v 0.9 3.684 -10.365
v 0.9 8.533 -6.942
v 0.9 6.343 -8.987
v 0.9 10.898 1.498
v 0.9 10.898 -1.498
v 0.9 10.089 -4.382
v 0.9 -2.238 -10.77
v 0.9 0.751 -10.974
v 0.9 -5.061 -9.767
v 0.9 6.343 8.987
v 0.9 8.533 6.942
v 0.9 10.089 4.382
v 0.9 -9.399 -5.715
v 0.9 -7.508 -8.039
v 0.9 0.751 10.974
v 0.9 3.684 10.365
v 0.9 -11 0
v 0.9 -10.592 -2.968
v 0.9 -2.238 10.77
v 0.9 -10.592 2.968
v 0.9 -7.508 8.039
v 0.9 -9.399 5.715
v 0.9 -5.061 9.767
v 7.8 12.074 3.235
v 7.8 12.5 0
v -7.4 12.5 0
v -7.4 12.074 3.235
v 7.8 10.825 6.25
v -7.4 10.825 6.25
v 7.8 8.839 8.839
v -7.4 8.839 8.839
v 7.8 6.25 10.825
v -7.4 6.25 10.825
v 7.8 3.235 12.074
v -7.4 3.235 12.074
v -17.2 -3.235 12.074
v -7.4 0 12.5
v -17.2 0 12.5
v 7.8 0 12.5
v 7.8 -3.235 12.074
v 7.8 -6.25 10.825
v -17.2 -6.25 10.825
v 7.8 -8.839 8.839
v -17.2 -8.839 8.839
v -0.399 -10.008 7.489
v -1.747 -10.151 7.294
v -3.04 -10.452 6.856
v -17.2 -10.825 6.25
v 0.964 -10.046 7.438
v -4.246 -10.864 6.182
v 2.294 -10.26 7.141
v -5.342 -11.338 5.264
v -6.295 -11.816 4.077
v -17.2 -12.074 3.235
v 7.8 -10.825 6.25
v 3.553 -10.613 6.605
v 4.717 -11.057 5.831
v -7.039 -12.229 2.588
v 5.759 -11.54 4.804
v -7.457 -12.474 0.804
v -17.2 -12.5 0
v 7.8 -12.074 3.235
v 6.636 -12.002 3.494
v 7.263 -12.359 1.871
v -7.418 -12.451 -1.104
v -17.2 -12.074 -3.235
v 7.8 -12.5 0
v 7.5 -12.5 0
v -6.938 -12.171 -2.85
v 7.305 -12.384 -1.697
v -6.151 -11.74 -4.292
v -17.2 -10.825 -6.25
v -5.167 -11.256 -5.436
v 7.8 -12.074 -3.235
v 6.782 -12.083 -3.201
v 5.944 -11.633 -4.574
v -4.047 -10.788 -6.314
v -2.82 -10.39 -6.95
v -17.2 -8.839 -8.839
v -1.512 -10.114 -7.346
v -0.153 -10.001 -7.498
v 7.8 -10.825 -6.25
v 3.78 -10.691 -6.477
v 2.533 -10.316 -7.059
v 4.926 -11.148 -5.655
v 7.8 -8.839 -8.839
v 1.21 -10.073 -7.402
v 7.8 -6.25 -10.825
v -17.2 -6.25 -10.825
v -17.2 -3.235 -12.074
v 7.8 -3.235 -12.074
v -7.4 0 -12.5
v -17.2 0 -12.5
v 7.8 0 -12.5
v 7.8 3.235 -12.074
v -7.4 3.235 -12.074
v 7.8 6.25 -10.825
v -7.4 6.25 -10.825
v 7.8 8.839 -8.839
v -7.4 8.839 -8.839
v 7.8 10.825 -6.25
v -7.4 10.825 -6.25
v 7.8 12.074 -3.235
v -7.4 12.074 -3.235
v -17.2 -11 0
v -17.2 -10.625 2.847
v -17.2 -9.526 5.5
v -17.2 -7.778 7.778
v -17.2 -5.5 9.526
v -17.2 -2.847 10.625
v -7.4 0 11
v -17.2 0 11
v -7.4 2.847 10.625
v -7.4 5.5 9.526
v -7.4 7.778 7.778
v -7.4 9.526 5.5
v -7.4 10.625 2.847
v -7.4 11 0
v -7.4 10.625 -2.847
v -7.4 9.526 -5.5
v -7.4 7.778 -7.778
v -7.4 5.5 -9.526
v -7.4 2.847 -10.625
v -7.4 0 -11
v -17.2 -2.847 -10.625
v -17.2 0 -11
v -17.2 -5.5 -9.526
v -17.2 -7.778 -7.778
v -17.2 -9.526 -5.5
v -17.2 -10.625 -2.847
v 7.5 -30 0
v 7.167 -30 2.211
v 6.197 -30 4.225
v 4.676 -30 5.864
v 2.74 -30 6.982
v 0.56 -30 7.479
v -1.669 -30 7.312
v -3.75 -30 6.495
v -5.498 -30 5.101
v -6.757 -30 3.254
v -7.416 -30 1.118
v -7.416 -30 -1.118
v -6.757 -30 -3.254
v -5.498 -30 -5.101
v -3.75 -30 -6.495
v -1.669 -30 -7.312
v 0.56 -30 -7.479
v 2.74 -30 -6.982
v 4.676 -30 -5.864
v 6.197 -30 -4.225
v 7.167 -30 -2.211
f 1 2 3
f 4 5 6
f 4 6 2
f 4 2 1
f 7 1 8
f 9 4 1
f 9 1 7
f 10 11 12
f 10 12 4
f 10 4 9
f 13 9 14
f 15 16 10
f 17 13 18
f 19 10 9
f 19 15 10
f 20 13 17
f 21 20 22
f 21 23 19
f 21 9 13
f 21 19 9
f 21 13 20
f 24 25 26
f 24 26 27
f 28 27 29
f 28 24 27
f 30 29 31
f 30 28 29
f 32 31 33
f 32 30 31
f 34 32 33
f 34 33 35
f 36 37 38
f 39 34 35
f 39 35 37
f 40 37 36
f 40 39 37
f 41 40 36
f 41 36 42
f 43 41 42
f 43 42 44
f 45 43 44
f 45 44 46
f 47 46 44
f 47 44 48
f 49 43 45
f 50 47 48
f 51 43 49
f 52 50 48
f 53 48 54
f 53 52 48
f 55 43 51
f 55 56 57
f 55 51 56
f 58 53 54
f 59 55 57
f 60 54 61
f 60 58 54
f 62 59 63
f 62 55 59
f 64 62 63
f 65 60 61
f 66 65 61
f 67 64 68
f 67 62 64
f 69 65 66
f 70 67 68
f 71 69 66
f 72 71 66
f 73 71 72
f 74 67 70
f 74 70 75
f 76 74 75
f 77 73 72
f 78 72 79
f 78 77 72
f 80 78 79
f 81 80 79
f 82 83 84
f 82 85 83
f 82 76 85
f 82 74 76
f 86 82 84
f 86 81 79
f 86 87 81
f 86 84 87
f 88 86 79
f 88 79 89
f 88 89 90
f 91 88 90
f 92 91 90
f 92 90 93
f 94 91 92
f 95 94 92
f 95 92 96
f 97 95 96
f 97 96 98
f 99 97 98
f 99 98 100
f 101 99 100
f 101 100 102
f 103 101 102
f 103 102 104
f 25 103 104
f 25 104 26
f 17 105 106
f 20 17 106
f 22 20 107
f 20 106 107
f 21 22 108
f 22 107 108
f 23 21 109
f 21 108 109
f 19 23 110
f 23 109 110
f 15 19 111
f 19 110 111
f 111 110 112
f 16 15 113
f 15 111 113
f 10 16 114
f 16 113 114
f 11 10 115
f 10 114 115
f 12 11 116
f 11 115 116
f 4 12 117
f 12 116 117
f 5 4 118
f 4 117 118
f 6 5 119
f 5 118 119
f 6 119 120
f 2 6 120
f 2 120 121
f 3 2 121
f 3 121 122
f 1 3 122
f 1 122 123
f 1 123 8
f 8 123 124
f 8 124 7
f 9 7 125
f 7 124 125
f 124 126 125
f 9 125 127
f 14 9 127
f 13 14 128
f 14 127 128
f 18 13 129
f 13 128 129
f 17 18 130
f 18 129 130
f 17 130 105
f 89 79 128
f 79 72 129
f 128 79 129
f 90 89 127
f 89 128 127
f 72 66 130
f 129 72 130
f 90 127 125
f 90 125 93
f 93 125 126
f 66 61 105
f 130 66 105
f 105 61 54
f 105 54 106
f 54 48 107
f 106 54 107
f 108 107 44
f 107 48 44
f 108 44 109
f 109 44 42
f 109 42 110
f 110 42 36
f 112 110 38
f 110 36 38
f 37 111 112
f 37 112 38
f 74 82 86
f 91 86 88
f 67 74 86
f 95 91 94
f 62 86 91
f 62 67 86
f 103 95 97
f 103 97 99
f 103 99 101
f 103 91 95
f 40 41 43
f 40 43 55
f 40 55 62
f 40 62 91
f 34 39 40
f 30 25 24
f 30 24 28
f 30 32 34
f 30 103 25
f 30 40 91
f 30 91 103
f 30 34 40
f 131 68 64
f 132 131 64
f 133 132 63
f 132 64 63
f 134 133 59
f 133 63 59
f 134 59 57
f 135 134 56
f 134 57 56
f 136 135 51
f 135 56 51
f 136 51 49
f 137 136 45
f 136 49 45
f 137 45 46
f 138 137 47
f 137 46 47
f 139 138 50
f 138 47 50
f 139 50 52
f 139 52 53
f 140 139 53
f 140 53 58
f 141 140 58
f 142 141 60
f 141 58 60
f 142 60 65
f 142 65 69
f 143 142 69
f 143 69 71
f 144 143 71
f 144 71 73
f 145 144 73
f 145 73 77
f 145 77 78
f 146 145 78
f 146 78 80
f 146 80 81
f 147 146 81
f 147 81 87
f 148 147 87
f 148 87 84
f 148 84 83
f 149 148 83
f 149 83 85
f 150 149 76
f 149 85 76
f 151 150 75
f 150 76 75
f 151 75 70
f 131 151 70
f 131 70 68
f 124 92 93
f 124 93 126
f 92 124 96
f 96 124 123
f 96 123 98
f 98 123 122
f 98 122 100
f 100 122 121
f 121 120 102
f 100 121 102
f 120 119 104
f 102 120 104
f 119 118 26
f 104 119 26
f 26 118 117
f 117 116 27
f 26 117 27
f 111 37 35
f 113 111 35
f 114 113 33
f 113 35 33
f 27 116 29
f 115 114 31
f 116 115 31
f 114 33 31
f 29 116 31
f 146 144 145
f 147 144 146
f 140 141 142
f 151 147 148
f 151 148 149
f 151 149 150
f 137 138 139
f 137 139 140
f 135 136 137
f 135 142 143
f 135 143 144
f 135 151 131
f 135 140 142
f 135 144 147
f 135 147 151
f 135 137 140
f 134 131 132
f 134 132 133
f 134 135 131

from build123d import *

# Parameters (mm, degrees)
F1_R     = 7.5
F2_DEPTH = 30
F3_R     = 12.5
F4_DEPTH = 25
F5_R     = 11
F6_DEPTH = 18.1
F8_W     = 15
F8_H     = 30.954544
F9_DEPTH = 25


with BuildPart() as f2:
    # F1 (on Front) → F2 (new body)
    with BuildSketch(Plane.XZ):
        Circle(F1_R)
    extrude(amount=F2_DEPTH)

    # F3 (on offset) → F4 (join)
    with BuildSketch(Plane.YZ.offset(7.8)):
        Circle(F3_R)
    extrude(amount=-F4_DEPTH)

    # F5 (on face) → F6 (cut)
    with BuildSketch(Plane(origin=(-17.2, 0, 0), x_dir=(0, -1, 0), z_dir=(-1, 0, 0))):
        Circle(F5_R)
    extrude(amount=-F6_DEPTH, mode=Mode.SUBTRACT)

    # F8 (on offset) → F9 (cut)
    with BuildSketch(Plane.YZ.offset(-7.4)):
        with Locations((7.5, 0)):
            Rectangle(F8_W, F8_H)
    extrude(amount=-F9_DEPTH, mode=Mode.SUBTRACT)


solid = f2.part
